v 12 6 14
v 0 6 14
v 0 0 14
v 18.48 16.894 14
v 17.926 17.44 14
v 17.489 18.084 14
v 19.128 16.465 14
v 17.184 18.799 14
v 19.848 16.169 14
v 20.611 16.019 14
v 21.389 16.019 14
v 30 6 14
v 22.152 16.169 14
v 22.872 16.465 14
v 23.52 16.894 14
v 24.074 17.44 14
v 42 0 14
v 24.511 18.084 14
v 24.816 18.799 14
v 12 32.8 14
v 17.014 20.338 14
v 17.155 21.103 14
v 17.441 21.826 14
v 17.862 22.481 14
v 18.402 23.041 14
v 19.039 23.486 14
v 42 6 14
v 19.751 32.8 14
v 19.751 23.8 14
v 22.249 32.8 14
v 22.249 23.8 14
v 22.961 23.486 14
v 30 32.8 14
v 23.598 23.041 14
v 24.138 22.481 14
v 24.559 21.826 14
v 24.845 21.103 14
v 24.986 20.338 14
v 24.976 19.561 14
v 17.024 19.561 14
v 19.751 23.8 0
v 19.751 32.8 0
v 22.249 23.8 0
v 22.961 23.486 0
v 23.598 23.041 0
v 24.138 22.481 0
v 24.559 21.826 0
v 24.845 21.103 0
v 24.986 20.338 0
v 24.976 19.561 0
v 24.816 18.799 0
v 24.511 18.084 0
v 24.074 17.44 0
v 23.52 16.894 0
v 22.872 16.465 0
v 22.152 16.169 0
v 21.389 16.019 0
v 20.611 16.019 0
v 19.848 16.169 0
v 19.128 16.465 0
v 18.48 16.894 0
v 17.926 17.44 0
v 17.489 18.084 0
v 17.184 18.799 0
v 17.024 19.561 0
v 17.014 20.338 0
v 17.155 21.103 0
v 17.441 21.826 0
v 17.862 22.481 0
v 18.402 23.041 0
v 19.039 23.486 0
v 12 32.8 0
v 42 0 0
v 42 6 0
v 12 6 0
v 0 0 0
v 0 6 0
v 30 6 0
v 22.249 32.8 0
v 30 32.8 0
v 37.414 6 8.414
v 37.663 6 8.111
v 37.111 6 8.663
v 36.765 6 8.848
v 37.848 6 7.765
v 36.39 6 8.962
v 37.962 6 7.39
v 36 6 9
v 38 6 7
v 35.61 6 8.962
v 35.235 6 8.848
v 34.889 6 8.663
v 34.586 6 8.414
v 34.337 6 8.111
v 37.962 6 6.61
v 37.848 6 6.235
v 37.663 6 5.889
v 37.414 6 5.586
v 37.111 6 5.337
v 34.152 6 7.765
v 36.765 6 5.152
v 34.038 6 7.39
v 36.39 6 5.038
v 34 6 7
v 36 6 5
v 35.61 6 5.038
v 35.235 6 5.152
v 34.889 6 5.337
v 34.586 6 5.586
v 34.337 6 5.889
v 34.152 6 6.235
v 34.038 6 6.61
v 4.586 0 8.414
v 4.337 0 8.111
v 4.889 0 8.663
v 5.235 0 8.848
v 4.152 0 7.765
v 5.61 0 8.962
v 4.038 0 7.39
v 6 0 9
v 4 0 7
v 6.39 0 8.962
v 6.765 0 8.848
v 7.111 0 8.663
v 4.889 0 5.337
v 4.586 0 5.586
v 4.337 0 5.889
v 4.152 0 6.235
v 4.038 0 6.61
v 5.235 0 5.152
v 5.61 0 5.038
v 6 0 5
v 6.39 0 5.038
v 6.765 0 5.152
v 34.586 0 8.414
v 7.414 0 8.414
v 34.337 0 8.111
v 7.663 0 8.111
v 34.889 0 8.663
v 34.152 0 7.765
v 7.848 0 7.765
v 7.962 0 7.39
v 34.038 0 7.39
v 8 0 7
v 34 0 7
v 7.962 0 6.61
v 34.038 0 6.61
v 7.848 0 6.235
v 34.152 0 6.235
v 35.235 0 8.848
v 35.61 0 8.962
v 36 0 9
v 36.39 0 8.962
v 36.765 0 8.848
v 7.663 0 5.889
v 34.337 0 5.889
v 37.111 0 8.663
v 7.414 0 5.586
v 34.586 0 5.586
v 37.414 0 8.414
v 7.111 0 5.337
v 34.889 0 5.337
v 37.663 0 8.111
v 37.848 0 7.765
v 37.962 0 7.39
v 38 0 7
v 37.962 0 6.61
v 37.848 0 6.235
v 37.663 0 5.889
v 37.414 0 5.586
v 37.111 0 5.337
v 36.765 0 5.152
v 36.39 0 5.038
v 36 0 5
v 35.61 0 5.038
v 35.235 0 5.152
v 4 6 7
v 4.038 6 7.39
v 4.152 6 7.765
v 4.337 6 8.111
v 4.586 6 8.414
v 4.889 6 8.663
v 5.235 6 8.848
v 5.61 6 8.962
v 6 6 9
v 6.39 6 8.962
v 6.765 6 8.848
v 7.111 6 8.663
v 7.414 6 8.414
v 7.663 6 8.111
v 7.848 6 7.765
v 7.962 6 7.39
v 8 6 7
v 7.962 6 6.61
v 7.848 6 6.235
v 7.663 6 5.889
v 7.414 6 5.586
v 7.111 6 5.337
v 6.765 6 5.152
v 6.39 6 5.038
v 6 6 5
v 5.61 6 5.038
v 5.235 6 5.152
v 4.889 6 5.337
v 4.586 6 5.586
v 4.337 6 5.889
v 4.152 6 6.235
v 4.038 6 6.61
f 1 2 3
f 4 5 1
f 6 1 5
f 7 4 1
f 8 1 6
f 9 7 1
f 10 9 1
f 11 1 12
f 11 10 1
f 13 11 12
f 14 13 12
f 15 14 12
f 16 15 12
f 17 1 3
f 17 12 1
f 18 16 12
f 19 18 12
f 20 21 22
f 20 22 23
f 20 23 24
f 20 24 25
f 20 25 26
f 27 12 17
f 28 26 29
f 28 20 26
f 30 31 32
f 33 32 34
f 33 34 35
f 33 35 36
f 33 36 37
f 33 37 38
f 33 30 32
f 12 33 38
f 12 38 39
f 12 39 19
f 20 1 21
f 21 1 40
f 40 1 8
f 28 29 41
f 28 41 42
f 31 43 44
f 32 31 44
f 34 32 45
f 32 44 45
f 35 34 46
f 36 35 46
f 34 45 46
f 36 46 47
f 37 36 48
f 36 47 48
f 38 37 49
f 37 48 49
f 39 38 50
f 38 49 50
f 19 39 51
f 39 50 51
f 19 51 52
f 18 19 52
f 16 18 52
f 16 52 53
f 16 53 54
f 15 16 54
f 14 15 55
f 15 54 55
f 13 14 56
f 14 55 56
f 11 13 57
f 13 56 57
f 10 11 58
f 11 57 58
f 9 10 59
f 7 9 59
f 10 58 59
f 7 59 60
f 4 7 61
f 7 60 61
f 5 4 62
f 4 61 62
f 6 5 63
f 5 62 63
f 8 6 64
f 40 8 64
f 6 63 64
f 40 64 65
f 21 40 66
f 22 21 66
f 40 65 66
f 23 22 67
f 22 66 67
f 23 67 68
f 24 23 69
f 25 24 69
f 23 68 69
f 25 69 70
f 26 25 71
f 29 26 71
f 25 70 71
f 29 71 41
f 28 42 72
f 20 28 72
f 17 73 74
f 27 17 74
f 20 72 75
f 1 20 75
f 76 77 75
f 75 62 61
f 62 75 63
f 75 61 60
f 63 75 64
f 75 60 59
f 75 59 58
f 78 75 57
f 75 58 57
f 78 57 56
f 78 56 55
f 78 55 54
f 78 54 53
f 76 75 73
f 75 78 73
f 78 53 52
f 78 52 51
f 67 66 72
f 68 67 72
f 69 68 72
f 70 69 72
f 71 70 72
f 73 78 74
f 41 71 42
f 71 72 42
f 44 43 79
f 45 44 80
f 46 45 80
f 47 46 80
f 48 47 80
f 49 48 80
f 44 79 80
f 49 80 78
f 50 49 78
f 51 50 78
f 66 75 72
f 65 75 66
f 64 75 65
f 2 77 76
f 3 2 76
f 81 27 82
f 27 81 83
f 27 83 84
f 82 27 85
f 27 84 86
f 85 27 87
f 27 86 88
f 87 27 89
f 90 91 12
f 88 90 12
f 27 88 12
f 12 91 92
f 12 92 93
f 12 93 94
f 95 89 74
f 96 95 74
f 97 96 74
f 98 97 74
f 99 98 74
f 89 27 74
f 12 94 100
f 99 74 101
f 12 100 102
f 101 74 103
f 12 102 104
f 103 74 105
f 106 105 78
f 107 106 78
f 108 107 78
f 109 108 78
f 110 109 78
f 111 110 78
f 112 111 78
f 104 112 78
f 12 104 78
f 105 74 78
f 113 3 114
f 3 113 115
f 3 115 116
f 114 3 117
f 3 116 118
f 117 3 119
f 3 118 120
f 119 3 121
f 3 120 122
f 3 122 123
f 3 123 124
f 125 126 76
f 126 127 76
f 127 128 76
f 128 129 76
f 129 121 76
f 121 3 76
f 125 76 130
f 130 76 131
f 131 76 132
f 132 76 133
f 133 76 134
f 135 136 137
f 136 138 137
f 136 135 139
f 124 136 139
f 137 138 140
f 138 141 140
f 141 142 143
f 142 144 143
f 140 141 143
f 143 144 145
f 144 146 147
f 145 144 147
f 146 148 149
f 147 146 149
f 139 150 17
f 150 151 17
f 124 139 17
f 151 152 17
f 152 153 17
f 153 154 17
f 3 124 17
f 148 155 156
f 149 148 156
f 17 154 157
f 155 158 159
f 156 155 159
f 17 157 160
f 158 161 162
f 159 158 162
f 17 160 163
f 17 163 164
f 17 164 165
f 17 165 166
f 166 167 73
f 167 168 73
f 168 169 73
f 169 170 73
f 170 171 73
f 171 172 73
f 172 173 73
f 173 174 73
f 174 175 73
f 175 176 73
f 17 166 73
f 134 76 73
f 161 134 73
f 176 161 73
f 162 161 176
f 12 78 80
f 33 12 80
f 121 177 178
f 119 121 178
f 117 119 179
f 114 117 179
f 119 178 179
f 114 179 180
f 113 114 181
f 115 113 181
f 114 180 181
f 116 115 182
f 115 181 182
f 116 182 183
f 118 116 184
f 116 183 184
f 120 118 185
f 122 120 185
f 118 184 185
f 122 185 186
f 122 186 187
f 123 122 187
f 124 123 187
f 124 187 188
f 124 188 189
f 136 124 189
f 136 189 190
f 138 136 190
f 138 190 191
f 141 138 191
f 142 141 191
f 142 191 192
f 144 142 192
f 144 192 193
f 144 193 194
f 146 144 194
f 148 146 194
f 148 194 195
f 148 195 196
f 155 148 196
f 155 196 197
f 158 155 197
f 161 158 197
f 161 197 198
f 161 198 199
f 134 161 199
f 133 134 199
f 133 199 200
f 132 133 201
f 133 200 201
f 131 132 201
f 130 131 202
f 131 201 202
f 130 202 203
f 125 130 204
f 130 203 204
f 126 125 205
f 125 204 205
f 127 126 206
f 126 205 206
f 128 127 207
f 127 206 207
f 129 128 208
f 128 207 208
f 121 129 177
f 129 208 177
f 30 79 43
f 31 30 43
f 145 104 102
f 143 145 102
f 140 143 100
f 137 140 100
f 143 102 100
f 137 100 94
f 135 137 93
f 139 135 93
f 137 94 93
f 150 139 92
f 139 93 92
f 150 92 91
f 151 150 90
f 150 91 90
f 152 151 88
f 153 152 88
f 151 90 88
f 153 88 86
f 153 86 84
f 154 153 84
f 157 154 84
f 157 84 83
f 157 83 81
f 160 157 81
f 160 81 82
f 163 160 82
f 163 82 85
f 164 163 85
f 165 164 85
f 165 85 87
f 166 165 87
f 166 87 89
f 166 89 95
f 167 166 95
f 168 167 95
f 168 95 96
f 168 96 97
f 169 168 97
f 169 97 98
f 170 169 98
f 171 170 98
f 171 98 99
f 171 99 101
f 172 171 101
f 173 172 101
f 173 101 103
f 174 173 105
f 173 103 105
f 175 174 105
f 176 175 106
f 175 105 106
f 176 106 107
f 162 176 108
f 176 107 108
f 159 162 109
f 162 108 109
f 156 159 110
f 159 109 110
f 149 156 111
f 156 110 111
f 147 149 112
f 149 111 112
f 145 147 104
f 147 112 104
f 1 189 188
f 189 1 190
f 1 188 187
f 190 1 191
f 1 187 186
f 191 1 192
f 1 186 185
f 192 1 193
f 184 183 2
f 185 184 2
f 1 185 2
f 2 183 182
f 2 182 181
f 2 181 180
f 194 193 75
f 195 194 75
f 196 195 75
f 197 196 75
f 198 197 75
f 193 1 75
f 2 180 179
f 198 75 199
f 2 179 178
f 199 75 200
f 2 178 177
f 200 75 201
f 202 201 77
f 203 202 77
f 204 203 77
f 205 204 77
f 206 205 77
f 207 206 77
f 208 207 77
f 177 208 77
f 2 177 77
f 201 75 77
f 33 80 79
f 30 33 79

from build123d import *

# Parameters (mm, degrees)
BOSS_EXTRUDE1_DEPTH = 14
SKETCH2_R           = 2
CUT_EXTRUDE1_DEPTH  = 52.751714947


with BuildPart() as part:
    # Sketch1 → Boss-Extrude1 (new body)
    with BuildSketch(Plane.XY):
        with BuildLine():
            Line((0, 0), (42, 0))
            Line((42, 0), (42, 6))
            Line((42, 6), (30, 6))
            Line((30, 6), (30, 32.8))
            Line((30, 32.8), (22.249007882, 32.8))
            Line((22.249007882, 32.8), (22.249007882, 23.8))
            ThreePointArc((22.249007882, 23.8), (21, 15.999997414), (19.750992118, 23.8))
            Line((19.750992118, 23.8), (19.750992118, 32.8))
            Line((19.750992118, 32.8), (12, 32.8))
            Line((12, 32.8), (12, 6))
            Line((12, 6), (0, 6))
            Line((0, 6), (0, 0))
        make_face()
    extrude(amount=BOSS_EXTRUDE1_DEPTH)

    # Sketch2 → Cut-Extrude1 (cut, through all)
    with BuildSketch(Plane(origin=(0, 6, 0), x_dir=(1, 0, 0), z_dir=(0, 1, 0))):
        with Locations(Location((6, -7, 0), (0, 0, 180))):
            Circle(SKETCH2_R)
        with Locations(Location((36, -7, 0), (0, 0, 180))):
            Circle(SKETCH2_R)
    extrude(amount=-CUT_EXTRUDE1_DEPTH, mode=Mode.SUBTRACT)


solid = part.part
